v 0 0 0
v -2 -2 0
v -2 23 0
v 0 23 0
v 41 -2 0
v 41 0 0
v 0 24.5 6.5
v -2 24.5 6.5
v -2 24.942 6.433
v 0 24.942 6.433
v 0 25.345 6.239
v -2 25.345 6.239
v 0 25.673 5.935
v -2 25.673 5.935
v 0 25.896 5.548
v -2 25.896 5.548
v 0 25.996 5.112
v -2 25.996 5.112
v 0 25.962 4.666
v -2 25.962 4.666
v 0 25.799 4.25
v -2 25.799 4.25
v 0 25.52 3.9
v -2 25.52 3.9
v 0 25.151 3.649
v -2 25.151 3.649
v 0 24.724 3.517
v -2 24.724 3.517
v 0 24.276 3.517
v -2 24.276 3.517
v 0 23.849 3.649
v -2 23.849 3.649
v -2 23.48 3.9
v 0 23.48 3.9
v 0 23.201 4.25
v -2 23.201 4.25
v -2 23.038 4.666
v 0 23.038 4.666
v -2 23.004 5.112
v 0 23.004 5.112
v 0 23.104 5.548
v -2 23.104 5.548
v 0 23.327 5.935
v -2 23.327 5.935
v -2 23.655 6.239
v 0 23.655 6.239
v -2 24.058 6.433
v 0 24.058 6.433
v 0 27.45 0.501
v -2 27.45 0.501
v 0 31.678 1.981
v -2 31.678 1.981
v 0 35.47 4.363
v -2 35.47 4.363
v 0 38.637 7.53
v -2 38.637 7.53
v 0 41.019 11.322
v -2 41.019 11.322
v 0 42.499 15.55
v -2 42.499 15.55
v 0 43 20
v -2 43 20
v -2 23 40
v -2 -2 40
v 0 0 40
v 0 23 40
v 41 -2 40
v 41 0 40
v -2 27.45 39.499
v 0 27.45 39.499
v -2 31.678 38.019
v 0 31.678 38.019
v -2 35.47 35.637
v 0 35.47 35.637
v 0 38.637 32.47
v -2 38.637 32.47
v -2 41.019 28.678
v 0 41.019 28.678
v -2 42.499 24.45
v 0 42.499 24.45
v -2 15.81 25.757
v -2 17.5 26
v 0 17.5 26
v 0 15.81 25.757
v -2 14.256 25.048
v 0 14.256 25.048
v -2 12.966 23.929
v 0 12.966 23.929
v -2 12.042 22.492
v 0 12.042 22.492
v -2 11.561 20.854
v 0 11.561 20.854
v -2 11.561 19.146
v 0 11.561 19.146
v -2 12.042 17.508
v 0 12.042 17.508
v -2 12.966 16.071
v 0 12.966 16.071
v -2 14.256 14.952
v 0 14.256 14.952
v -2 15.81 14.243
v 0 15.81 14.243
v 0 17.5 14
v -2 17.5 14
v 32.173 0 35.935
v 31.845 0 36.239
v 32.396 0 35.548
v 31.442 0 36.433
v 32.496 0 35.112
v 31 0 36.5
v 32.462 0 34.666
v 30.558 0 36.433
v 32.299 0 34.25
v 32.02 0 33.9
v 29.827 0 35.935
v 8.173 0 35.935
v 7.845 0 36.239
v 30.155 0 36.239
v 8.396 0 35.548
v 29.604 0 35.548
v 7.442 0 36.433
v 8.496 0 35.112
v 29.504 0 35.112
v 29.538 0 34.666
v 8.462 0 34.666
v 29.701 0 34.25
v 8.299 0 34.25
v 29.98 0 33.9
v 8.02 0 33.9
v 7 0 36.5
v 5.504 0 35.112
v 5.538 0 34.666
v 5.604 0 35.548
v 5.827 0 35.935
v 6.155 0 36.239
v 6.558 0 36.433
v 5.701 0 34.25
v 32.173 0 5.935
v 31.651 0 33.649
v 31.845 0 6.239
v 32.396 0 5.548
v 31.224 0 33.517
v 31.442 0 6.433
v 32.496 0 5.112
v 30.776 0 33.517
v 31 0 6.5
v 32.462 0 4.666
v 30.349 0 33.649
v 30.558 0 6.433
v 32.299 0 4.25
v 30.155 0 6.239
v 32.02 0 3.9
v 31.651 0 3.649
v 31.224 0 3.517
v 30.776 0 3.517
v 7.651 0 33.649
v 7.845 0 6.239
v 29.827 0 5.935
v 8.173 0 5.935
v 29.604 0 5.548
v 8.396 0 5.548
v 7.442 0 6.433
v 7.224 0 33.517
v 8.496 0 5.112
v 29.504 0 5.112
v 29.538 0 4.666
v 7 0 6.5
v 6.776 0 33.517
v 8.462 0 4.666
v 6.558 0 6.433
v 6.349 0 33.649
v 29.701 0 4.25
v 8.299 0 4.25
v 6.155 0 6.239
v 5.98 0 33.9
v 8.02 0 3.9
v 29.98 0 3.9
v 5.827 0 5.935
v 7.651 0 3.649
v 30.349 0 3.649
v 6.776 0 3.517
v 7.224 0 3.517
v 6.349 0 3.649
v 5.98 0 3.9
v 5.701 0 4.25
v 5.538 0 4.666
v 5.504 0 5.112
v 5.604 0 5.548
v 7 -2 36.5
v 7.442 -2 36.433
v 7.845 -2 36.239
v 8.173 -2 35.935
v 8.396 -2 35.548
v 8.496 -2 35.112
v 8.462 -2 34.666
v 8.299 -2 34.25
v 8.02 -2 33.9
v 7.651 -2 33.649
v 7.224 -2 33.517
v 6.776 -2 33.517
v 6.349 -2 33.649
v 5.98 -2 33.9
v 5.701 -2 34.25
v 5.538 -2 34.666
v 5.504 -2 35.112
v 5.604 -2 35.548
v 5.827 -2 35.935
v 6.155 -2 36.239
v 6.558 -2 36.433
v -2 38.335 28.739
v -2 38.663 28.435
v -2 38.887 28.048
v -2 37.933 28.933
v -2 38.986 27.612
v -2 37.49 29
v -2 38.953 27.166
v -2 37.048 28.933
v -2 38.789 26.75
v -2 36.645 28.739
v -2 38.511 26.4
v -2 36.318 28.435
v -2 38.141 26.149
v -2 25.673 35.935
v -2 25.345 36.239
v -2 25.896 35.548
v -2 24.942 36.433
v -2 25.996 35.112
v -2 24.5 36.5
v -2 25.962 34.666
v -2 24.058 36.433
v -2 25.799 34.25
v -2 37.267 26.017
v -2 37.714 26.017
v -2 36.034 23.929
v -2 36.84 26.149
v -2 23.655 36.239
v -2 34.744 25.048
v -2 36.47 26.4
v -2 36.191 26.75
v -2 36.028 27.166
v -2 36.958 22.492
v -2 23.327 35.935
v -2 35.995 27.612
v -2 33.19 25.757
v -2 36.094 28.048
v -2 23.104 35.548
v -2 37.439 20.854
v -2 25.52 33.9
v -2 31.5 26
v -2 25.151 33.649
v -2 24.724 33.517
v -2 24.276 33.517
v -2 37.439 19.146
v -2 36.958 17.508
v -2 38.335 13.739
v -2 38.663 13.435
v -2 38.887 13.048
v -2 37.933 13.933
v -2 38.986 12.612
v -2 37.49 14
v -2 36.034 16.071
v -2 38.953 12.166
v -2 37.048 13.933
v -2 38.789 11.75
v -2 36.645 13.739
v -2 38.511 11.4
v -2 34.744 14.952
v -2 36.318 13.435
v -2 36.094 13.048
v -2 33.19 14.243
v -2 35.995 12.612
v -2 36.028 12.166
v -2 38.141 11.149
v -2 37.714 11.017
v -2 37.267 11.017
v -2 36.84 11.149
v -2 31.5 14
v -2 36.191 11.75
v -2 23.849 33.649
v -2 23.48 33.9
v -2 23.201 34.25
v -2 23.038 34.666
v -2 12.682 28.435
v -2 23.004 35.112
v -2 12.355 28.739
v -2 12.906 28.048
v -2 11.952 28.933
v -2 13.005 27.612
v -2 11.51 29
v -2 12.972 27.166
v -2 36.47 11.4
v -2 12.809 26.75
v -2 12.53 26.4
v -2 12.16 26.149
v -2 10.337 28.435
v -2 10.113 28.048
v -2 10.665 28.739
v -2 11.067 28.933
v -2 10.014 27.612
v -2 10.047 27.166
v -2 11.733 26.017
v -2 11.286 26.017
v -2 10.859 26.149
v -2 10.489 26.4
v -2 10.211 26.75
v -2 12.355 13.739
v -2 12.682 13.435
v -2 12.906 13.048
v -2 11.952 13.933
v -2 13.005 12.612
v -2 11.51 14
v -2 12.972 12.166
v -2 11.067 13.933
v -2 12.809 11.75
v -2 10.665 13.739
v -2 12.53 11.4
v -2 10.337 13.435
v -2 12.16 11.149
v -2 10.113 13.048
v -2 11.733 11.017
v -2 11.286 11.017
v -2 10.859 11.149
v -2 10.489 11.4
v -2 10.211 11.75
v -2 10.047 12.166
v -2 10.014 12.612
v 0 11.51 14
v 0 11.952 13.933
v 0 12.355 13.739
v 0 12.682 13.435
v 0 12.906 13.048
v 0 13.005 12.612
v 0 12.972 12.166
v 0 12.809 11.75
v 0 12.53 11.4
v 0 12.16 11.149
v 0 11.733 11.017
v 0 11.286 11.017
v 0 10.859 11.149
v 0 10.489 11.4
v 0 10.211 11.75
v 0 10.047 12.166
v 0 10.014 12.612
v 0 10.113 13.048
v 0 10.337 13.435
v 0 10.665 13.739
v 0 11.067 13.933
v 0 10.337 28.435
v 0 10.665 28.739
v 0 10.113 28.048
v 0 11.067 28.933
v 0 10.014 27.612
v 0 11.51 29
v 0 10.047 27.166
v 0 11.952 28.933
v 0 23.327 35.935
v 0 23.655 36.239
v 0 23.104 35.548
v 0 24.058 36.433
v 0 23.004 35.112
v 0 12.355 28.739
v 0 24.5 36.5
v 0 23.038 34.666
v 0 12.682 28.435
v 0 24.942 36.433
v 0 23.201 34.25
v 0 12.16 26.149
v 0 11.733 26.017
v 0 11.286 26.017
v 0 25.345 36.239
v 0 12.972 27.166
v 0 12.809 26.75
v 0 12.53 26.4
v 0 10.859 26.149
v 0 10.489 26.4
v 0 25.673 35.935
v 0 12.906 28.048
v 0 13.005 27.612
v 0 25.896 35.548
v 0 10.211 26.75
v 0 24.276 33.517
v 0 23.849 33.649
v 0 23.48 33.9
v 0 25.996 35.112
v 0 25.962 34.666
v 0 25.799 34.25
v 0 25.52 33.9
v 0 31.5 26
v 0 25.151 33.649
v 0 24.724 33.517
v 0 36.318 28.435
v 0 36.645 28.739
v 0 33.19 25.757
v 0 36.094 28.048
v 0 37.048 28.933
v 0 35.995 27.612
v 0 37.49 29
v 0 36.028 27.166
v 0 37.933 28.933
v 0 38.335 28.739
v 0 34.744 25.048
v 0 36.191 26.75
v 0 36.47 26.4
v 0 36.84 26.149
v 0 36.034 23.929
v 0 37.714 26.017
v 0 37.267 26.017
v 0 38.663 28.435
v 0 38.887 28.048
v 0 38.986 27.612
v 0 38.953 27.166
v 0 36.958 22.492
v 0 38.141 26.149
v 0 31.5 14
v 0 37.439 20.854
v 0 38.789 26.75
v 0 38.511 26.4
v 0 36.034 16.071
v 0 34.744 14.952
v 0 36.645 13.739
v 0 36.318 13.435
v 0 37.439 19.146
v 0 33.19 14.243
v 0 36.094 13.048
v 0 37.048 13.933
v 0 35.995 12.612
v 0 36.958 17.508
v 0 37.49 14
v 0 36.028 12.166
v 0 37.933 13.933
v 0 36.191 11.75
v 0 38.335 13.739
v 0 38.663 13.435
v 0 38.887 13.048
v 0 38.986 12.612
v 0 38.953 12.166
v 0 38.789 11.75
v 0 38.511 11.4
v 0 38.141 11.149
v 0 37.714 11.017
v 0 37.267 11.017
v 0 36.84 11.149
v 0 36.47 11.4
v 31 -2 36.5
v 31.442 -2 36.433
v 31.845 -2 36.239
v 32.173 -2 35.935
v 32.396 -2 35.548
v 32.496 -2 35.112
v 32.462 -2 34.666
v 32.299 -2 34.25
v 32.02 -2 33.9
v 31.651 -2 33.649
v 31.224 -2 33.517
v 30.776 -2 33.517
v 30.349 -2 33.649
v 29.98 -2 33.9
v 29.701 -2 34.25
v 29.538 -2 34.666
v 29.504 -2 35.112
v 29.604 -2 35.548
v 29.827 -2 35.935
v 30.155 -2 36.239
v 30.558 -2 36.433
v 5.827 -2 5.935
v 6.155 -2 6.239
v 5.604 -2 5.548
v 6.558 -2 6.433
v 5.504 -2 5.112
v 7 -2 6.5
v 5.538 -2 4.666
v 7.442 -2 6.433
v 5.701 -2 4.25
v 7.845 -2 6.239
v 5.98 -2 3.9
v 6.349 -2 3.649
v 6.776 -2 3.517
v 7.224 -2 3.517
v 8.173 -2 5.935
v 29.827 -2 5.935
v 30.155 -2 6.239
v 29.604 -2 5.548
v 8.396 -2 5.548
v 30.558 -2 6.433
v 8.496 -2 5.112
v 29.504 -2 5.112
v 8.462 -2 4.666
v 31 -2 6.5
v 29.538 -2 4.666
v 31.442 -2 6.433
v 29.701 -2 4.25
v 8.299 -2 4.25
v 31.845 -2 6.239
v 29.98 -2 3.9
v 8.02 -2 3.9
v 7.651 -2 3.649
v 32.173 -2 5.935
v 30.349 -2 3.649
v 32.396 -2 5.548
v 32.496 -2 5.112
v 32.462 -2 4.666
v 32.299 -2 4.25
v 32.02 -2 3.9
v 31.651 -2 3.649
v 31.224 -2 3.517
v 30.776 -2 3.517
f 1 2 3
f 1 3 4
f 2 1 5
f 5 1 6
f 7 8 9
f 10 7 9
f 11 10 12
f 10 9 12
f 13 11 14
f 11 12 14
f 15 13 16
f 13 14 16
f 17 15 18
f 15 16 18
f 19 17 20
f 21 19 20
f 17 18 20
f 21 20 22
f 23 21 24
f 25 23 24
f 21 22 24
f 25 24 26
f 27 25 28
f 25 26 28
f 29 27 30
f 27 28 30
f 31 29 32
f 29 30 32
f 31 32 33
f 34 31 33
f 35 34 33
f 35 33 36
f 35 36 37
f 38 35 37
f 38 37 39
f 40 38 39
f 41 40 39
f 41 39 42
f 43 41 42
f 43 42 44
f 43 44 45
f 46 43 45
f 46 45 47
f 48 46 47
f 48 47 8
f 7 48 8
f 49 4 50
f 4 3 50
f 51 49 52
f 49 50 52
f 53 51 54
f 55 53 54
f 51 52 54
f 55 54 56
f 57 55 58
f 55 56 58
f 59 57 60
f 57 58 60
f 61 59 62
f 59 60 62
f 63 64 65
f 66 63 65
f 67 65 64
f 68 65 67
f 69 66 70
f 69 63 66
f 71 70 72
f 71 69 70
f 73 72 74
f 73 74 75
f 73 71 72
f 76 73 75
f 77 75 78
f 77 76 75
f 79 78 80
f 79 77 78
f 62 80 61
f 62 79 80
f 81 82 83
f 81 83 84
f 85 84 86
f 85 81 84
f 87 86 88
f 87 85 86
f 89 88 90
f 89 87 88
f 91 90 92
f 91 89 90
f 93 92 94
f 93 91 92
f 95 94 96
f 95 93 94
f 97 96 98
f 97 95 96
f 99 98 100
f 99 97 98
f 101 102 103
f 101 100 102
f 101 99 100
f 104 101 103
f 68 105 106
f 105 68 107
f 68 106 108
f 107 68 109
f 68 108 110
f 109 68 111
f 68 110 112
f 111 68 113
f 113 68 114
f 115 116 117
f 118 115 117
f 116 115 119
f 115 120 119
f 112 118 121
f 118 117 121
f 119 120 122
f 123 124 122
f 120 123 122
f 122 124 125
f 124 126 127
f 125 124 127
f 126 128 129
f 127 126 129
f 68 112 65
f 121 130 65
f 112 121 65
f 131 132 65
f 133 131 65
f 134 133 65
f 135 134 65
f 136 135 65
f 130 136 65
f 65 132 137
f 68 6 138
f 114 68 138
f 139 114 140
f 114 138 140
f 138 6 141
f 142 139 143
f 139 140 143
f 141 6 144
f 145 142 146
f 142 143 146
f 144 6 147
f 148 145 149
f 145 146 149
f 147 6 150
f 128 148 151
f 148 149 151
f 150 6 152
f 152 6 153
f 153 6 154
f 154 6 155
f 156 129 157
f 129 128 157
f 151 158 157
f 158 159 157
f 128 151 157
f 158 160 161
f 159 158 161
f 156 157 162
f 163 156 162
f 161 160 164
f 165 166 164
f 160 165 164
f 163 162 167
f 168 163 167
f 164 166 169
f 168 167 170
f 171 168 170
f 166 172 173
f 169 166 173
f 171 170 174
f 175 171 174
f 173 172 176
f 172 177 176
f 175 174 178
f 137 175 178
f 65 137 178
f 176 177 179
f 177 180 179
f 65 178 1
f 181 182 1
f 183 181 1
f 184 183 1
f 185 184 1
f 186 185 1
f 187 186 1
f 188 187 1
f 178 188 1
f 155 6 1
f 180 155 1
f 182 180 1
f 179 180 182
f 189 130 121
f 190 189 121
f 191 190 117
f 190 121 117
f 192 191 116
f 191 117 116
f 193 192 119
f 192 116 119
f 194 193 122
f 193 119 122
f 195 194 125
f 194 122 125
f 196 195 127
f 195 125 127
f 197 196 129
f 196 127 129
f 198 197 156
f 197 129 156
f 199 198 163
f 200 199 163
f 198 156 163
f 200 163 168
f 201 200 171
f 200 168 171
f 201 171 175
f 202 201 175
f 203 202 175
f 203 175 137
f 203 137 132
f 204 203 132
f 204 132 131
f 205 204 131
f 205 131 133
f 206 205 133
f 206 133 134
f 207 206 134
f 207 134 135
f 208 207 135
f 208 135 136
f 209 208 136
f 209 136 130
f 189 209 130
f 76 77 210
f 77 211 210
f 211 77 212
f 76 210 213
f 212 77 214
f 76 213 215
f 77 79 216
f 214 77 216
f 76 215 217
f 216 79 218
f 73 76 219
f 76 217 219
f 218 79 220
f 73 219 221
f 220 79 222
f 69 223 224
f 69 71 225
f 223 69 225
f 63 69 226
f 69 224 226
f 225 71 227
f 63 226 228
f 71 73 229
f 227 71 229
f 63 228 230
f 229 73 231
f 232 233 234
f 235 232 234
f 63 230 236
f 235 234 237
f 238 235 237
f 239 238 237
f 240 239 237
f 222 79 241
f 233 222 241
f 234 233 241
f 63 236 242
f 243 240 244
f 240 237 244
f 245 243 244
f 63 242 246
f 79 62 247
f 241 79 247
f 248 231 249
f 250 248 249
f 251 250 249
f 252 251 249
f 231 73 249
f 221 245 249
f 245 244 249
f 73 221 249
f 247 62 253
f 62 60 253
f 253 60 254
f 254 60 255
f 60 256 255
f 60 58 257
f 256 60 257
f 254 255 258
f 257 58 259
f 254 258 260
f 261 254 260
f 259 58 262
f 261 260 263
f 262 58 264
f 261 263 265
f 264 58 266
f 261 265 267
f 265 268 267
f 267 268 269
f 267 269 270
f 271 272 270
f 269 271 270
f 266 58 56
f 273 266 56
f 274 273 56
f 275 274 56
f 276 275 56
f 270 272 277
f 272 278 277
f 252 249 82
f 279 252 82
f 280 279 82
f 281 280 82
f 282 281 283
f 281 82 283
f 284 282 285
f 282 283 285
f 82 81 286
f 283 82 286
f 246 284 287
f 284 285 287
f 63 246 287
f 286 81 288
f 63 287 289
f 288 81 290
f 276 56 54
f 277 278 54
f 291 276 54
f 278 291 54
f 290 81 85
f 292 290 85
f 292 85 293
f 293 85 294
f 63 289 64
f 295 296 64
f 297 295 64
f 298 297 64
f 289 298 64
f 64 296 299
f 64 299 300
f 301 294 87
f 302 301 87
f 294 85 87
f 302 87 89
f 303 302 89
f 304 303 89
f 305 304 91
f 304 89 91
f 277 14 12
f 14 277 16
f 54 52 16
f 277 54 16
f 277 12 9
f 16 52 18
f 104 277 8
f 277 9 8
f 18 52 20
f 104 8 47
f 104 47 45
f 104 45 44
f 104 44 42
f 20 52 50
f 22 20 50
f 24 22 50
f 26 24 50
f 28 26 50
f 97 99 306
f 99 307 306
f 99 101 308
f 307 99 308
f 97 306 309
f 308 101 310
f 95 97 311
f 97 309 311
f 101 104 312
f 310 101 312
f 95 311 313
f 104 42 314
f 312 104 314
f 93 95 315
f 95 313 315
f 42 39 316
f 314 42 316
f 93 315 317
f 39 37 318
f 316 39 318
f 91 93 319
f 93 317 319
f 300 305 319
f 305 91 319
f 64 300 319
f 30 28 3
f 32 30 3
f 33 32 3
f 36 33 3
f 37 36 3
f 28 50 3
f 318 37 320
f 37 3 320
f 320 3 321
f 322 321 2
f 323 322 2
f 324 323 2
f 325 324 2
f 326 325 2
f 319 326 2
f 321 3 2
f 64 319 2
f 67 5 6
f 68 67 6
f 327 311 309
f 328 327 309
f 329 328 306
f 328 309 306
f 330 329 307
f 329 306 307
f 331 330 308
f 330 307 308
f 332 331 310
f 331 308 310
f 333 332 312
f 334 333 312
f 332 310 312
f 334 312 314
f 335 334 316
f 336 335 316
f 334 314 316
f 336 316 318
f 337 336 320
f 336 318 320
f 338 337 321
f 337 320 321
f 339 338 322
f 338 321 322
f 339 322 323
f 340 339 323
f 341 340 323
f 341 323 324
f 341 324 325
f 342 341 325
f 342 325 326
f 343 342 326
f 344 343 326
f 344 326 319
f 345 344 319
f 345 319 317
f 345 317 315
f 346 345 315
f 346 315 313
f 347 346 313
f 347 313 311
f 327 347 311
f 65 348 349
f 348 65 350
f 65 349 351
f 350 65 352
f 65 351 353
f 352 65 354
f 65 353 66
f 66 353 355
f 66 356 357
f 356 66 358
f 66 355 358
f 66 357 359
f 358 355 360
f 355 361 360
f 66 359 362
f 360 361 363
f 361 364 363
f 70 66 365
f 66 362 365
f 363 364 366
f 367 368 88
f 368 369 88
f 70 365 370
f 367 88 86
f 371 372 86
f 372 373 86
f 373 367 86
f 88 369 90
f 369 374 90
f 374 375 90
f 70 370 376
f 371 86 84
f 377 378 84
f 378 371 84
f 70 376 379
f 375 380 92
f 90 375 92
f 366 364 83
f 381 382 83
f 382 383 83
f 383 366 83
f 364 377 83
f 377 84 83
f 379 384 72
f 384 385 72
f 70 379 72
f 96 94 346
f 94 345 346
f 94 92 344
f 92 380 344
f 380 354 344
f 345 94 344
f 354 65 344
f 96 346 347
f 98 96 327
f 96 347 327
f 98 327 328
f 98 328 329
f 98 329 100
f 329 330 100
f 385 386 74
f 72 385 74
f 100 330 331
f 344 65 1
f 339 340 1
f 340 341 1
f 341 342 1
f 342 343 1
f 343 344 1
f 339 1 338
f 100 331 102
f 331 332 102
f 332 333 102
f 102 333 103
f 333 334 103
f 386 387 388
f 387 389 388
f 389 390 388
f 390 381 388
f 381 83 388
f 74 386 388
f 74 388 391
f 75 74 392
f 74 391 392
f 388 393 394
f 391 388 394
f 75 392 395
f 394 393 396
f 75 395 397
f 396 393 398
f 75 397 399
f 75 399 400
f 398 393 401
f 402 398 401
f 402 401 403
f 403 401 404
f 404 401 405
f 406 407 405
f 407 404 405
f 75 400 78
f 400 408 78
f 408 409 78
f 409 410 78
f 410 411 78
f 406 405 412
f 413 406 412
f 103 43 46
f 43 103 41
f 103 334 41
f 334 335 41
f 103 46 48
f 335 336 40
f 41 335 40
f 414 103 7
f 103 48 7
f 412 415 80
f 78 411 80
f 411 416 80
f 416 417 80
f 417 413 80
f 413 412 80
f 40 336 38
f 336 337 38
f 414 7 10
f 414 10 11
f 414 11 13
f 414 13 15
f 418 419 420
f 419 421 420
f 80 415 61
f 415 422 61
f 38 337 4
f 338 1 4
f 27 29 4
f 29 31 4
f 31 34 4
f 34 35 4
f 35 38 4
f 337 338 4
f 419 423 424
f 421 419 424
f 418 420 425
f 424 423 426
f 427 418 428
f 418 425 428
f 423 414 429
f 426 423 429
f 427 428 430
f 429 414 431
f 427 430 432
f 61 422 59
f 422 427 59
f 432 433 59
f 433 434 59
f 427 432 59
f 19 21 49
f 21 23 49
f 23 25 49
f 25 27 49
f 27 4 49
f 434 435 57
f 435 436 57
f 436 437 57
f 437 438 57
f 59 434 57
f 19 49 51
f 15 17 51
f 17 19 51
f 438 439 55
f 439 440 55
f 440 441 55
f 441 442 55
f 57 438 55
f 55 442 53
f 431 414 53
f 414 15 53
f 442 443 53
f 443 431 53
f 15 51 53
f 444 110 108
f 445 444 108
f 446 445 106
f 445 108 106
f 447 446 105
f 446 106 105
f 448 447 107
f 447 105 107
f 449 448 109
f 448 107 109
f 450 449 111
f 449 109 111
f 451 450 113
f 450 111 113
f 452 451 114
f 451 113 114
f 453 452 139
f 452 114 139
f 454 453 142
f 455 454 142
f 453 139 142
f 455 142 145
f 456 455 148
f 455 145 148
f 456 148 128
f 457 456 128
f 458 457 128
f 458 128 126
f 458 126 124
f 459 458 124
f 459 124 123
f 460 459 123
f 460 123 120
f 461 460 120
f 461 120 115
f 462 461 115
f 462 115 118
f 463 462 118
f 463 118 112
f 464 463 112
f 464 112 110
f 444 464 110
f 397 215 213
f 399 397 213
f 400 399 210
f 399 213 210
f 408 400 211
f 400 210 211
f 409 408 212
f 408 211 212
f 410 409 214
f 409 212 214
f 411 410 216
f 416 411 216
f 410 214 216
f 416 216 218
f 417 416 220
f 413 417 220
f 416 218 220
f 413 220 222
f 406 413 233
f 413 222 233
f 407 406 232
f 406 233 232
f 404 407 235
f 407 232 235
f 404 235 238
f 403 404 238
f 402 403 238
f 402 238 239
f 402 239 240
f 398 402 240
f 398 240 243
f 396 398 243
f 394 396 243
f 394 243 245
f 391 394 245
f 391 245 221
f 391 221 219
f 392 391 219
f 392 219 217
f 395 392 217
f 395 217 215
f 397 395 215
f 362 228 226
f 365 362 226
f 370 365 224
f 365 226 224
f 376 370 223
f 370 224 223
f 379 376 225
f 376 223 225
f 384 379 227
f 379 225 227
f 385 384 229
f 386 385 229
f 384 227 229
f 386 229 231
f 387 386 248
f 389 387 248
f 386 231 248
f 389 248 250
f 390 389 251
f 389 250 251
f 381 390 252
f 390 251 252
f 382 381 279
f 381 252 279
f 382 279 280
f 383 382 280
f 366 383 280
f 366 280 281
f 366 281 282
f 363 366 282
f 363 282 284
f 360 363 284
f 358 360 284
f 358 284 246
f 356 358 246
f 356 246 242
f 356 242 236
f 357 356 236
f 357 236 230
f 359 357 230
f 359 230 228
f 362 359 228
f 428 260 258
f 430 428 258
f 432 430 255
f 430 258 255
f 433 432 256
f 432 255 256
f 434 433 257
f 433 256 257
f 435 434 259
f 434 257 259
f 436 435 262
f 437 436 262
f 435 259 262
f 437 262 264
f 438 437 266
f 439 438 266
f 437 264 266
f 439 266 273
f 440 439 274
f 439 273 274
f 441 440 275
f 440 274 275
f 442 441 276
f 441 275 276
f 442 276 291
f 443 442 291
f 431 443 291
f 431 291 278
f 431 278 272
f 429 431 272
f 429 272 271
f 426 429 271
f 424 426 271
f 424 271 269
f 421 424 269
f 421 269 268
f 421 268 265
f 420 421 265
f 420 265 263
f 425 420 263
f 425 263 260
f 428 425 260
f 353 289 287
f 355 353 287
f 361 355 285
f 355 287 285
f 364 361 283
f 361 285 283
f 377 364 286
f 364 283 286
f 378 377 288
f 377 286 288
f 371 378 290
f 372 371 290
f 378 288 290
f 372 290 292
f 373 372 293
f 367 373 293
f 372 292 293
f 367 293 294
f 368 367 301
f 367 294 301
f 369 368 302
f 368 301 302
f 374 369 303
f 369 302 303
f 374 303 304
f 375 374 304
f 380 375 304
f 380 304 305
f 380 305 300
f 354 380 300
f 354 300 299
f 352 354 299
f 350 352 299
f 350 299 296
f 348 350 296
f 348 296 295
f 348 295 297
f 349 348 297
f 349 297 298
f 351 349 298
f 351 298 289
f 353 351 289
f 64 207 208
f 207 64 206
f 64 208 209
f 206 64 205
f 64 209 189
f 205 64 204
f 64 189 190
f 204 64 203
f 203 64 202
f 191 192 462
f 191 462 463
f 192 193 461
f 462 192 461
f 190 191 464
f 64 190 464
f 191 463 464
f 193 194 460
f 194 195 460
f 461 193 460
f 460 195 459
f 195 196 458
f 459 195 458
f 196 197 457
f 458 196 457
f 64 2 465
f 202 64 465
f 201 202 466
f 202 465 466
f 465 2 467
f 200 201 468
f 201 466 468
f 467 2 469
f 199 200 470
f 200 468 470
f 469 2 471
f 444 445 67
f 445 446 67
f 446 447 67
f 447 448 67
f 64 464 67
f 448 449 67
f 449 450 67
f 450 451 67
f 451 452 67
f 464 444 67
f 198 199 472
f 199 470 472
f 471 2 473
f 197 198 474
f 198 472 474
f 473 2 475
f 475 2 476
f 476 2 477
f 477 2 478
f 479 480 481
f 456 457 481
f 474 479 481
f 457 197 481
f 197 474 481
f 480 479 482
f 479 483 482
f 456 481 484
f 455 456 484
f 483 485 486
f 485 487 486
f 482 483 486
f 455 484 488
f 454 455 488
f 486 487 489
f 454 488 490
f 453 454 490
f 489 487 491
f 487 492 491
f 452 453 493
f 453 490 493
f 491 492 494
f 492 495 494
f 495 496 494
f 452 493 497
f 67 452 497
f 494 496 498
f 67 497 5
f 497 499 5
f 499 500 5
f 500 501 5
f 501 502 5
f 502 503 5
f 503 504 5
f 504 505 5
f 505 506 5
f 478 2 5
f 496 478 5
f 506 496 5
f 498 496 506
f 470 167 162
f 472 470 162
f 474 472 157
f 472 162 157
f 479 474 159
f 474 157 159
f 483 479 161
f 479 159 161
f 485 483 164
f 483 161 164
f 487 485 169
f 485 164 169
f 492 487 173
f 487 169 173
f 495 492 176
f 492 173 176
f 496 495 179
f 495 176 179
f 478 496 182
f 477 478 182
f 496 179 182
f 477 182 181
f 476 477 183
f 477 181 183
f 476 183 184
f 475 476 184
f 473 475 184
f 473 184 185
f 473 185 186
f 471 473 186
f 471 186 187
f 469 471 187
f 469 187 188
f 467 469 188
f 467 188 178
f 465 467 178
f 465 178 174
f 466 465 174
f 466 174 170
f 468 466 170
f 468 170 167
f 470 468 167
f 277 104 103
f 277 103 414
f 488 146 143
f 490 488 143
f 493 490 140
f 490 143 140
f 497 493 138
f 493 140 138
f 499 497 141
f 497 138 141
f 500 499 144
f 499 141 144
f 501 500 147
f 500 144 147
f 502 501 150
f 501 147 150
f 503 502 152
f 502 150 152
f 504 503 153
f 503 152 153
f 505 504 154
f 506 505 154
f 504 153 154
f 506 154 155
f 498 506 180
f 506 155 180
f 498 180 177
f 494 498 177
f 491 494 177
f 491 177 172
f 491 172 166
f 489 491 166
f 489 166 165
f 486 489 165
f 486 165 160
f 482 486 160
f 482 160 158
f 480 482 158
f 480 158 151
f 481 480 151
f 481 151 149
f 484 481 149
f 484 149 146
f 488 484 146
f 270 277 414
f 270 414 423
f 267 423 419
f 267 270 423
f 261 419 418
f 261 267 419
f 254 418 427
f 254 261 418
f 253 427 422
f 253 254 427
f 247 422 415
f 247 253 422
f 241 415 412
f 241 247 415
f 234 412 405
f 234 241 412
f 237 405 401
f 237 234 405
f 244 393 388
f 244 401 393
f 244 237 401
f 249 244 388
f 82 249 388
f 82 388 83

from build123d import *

# Parameters (mm, degrees)
EXTRUDE_1_DEPTH     = 40
SKETCH_2_R          = 1.5
CUT_EXTRUDE_1_DEPTH = 73.78736154
FILLET_1_R          = 20
CUT_EXTRUDE_2_DEPTH = 73.78736154
SKETCH_4_R          = 1.5
CUT_EXTRUDE_3_DEPTH = 72.624018318


with BuildPart() as part:
    # 草图1 → 拉伸-薄壁1 (new body)
    with BuildSketch(Plane.XY):
        Polygon((41, 0), (0, 0), (0, 43), (-2, 43), (-2, -2), (41, -2), align=None)
    extrude(amount=EXTRUDE_1_DEPTH)

    # 草图2 → 切除-拉伸1 (cut, through all)
    with BuildSketch(Plane.ZY.offset(2)):
        with Locations((35, 24.5)):
            Circle(SKETCH_2_R)
        with Locations((27.5, 11.509618943)):
            Circle(SKETCH_2_R)
        with Locations((12.5, 11.509618943)):
            Circle(SKETCH_2_R)
        with Locations((5, 24.5)):
            Circle(SKETCH_2_R)
        with Locations((12.5, 37.490381057)):
            Circle(SKETCH_2_R)
        with Locations((27.5, 37.490381057)):
            Circle(SKETCH_2_R)
    extrude(amount=-CUT_EXTRUDE_1_DEPTH, mode=Mode.SUBTRACT)

    # 圆角1
    fillet_1_edges = [part.edges().sort_by_distance(p)[0] for p in [
        (-1, 43, 40),
        (-1, 43, 0),
    ]]
    fillet(fillet_1_edges, radius=FILLET_1_R - 0.0001)  # a hair under: the kernel refuses the full size

    # 草图3 → 切除-拉伸2 (cut, through all)
    with BuildSketch(Plane.ZY.offset(2)):
        with BuildLine():
            Line((26, 31.5), (26, 17.5))
            ThreePointArc((26, 17.5), (20, 11.5), (14, 17.5))
            Line((14, 17.5), (14, 31.5))
            ThreePointArc((14, 31.5), (20, 37.5), (26, 31.5))
        make_face()
    extrude(amount=-CUT_EXTRUDE_2_DEPTH, mode=Mode.SUBTRACT)

    # 草图4 → 切除-拉伸3 (cut, through all)
    with BuildSketch(Plane(origin=(0, 0, 0), x_dir=(1, 0, 0), z_dir=(0, 1, 0))):
        with Locations(Location((7, -35, 0), (0, 0, 270))):
            Circle(SKETCH_4_R)
        with Locations(Location((31, -35, 0), (0, 0, 270))):
            Circle(SKETCH_4_R)
        with Locations(Location((31, -5, 0), (0, 0, 270))):
            Circle(SKETCH_4_R)
        with Locations(Location((7, -5, 0), (0, 0, 270))):
            Circle(SKETCH_4_R)
    extrude(amount=-CUT_EXTRUDE_3_DEPTH, mode=Mode.SUBTRACT)


solid = part.part
